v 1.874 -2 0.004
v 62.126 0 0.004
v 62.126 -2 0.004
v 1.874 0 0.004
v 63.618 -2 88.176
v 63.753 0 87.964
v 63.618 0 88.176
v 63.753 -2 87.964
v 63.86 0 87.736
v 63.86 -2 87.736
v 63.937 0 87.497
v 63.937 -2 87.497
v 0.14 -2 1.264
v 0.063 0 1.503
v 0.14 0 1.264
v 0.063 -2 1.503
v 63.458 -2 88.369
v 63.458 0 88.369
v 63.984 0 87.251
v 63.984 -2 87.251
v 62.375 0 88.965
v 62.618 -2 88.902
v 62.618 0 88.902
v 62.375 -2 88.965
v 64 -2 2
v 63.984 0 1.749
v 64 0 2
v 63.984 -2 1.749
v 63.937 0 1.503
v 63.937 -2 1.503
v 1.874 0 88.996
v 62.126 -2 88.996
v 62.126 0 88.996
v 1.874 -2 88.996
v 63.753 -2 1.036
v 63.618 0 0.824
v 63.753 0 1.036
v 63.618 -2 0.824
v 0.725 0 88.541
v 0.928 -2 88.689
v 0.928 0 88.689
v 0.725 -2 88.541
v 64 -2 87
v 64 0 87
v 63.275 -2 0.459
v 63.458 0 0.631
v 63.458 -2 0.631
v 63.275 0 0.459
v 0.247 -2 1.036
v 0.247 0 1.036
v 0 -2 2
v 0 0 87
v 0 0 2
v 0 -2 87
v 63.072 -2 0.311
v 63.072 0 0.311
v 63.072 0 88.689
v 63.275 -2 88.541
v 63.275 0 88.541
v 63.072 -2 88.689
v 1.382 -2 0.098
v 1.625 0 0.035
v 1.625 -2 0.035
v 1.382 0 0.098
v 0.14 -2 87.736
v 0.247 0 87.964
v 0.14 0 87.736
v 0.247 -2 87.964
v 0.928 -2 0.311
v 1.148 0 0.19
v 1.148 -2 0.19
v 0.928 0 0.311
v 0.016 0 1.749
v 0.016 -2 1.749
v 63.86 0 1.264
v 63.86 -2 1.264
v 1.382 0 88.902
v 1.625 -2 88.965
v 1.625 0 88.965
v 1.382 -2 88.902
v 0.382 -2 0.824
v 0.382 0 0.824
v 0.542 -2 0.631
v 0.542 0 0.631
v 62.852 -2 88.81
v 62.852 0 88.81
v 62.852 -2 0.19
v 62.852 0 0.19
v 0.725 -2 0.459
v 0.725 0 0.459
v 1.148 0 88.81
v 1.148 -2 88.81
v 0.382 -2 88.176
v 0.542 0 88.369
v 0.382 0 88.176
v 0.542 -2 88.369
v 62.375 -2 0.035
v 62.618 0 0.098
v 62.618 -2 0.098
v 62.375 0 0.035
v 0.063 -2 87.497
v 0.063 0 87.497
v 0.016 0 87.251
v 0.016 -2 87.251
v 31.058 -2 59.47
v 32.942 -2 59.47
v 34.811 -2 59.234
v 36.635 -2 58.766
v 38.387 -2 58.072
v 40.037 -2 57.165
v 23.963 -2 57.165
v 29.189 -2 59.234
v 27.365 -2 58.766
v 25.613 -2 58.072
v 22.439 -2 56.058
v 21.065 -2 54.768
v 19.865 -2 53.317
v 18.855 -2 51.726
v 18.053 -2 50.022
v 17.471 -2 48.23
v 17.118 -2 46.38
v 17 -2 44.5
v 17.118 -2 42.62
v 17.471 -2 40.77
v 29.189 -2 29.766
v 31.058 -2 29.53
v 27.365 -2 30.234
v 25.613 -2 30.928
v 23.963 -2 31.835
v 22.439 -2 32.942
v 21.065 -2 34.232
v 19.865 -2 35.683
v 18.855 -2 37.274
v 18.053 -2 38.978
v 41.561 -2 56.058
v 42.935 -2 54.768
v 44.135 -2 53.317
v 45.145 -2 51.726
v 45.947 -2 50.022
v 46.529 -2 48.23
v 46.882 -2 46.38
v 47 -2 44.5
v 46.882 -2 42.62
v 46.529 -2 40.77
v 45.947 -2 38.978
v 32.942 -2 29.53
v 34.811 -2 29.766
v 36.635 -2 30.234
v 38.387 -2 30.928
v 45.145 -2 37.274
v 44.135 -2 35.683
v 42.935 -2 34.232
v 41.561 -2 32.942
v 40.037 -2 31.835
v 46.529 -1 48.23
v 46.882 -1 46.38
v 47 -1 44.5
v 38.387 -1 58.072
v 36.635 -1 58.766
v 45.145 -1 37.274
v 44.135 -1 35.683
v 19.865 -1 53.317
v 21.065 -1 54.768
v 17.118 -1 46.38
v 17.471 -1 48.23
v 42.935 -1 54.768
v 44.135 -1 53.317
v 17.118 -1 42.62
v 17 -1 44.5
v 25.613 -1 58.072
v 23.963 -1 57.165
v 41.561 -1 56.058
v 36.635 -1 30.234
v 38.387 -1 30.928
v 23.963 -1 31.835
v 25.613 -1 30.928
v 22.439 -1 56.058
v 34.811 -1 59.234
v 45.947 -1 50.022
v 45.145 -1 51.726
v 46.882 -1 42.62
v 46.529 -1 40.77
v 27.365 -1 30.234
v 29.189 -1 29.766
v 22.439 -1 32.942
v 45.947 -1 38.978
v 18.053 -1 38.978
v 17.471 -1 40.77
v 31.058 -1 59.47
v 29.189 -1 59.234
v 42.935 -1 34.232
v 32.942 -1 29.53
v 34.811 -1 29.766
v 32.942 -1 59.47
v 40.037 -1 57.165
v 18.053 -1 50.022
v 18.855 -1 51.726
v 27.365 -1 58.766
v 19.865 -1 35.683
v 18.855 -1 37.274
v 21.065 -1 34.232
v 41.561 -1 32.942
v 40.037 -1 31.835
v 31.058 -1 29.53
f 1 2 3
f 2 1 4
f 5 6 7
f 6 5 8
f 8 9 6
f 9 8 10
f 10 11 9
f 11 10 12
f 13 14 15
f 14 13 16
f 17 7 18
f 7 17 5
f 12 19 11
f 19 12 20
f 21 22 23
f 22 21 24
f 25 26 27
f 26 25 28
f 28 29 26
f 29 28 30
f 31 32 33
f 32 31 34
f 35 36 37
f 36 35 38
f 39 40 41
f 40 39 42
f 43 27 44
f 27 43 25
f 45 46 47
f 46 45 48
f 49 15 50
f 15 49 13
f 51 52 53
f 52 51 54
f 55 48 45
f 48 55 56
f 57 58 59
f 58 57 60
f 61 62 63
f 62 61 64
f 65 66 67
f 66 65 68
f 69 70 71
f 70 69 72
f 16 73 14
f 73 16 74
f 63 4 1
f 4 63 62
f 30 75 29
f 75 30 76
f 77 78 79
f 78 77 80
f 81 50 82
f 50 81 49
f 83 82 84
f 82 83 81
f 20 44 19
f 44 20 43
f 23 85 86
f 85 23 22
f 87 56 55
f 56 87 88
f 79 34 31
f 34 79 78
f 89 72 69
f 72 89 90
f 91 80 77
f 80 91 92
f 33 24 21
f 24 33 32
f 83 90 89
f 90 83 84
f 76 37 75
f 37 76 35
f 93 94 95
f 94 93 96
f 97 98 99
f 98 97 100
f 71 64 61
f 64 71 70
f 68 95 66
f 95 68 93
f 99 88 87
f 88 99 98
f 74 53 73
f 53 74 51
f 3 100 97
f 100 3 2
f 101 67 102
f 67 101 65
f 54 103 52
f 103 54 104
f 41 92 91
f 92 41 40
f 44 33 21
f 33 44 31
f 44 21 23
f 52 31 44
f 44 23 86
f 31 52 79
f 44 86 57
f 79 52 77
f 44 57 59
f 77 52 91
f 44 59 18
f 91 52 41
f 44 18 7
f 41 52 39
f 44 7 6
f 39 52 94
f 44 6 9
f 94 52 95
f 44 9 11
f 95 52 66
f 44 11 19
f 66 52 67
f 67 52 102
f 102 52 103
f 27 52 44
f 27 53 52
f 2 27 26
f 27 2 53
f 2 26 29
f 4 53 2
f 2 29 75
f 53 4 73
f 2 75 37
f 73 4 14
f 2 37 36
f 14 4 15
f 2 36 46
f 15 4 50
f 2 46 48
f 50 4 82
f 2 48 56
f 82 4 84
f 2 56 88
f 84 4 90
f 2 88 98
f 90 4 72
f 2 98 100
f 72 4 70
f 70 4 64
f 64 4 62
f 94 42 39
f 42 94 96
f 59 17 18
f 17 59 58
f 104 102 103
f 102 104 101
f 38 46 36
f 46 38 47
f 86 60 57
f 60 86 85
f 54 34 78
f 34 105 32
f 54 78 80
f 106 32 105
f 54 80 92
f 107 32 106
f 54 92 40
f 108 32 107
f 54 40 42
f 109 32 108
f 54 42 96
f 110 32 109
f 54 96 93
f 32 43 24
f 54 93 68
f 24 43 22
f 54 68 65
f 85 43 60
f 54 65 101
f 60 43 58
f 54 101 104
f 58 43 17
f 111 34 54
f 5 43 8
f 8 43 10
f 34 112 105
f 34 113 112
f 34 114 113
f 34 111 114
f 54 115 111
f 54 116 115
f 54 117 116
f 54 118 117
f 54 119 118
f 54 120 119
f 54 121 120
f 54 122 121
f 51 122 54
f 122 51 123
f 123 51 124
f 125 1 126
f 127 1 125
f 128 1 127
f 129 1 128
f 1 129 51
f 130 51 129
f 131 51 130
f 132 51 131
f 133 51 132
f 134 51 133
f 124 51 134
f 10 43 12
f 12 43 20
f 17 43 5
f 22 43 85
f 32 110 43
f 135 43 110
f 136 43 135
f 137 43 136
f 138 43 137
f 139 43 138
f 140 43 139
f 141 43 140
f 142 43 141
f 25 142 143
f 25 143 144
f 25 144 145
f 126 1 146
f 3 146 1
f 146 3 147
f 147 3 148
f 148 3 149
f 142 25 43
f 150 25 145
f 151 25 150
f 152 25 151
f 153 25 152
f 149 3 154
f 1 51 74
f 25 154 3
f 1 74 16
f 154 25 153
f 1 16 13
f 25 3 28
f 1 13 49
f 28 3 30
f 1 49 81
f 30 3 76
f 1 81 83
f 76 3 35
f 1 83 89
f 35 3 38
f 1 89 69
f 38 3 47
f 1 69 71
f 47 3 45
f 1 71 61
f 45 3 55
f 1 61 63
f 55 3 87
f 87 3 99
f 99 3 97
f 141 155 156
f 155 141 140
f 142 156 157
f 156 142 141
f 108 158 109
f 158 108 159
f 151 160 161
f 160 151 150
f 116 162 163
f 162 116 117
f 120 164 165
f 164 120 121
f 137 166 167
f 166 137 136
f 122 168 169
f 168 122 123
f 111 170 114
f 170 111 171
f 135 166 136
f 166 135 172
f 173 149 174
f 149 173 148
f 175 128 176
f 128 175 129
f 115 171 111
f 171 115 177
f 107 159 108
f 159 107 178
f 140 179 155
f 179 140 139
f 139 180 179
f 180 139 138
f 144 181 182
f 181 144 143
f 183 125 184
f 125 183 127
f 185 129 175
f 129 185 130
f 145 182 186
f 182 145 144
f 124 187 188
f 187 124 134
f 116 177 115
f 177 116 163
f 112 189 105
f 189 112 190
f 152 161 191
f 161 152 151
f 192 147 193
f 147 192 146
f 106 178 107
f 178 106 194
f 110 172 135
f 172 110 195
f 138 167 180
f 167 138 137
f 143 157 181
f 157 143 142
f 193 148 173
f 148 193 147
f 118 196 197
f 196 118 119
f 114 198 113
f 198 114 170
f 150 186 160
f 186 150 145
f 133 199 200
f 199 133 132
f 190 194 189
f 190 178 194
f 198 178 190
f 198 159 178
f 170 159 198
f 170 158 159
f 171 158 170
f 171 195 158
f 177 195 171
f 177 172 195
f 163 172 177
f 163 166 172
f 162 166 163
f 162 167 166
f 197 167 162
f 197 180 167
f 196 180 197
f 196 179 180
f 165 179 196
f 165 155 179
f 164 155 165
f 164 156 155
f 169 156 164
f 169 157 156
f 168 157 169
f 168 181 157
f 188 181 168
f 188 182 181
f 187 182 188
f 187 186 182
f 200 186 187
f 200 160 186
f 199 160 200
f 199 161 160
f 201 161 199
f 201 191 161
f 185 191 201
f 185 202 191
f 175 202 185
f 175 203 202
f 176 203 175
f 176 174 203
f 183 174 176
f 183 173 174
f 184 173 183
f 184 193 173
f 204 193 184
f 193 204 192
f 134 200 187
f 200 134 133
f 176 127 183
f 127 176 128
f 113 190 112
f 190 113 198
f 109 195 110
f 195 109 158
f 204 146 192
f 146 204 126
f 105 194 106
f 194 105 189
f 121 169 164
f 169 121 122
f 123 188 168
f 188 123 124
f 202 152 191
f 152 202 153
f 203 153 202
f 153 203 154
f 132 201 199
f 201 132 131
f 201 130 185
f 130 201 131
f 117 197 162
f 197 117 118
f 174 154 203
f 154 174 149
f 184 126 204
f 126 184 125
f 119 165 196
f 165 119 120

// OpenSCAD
$fn=50;

module rounded_square(d,r) {
    minkowski() {
        translate([r,r]) square([d[0]-2*r, d[1]-2*r]);
        circle(r);
    }
}
difference(){
color( [1, 1, 1, 1] ) { 
rotate([90,0,0])
linear_extrude(height = 2)
        rounded_square([64,89], 2);
}
    { 
    translate([4,-2,75])
    rotate([90,0,0]) 
    text("A");}
    translate([50,-2,14])
    rotate([270,0,0]) 
    text("A");
    
    translate([32,-2,44.5])
    rotate([90,0,0])
        cylinder(  2, d=30, center=true);
    }
